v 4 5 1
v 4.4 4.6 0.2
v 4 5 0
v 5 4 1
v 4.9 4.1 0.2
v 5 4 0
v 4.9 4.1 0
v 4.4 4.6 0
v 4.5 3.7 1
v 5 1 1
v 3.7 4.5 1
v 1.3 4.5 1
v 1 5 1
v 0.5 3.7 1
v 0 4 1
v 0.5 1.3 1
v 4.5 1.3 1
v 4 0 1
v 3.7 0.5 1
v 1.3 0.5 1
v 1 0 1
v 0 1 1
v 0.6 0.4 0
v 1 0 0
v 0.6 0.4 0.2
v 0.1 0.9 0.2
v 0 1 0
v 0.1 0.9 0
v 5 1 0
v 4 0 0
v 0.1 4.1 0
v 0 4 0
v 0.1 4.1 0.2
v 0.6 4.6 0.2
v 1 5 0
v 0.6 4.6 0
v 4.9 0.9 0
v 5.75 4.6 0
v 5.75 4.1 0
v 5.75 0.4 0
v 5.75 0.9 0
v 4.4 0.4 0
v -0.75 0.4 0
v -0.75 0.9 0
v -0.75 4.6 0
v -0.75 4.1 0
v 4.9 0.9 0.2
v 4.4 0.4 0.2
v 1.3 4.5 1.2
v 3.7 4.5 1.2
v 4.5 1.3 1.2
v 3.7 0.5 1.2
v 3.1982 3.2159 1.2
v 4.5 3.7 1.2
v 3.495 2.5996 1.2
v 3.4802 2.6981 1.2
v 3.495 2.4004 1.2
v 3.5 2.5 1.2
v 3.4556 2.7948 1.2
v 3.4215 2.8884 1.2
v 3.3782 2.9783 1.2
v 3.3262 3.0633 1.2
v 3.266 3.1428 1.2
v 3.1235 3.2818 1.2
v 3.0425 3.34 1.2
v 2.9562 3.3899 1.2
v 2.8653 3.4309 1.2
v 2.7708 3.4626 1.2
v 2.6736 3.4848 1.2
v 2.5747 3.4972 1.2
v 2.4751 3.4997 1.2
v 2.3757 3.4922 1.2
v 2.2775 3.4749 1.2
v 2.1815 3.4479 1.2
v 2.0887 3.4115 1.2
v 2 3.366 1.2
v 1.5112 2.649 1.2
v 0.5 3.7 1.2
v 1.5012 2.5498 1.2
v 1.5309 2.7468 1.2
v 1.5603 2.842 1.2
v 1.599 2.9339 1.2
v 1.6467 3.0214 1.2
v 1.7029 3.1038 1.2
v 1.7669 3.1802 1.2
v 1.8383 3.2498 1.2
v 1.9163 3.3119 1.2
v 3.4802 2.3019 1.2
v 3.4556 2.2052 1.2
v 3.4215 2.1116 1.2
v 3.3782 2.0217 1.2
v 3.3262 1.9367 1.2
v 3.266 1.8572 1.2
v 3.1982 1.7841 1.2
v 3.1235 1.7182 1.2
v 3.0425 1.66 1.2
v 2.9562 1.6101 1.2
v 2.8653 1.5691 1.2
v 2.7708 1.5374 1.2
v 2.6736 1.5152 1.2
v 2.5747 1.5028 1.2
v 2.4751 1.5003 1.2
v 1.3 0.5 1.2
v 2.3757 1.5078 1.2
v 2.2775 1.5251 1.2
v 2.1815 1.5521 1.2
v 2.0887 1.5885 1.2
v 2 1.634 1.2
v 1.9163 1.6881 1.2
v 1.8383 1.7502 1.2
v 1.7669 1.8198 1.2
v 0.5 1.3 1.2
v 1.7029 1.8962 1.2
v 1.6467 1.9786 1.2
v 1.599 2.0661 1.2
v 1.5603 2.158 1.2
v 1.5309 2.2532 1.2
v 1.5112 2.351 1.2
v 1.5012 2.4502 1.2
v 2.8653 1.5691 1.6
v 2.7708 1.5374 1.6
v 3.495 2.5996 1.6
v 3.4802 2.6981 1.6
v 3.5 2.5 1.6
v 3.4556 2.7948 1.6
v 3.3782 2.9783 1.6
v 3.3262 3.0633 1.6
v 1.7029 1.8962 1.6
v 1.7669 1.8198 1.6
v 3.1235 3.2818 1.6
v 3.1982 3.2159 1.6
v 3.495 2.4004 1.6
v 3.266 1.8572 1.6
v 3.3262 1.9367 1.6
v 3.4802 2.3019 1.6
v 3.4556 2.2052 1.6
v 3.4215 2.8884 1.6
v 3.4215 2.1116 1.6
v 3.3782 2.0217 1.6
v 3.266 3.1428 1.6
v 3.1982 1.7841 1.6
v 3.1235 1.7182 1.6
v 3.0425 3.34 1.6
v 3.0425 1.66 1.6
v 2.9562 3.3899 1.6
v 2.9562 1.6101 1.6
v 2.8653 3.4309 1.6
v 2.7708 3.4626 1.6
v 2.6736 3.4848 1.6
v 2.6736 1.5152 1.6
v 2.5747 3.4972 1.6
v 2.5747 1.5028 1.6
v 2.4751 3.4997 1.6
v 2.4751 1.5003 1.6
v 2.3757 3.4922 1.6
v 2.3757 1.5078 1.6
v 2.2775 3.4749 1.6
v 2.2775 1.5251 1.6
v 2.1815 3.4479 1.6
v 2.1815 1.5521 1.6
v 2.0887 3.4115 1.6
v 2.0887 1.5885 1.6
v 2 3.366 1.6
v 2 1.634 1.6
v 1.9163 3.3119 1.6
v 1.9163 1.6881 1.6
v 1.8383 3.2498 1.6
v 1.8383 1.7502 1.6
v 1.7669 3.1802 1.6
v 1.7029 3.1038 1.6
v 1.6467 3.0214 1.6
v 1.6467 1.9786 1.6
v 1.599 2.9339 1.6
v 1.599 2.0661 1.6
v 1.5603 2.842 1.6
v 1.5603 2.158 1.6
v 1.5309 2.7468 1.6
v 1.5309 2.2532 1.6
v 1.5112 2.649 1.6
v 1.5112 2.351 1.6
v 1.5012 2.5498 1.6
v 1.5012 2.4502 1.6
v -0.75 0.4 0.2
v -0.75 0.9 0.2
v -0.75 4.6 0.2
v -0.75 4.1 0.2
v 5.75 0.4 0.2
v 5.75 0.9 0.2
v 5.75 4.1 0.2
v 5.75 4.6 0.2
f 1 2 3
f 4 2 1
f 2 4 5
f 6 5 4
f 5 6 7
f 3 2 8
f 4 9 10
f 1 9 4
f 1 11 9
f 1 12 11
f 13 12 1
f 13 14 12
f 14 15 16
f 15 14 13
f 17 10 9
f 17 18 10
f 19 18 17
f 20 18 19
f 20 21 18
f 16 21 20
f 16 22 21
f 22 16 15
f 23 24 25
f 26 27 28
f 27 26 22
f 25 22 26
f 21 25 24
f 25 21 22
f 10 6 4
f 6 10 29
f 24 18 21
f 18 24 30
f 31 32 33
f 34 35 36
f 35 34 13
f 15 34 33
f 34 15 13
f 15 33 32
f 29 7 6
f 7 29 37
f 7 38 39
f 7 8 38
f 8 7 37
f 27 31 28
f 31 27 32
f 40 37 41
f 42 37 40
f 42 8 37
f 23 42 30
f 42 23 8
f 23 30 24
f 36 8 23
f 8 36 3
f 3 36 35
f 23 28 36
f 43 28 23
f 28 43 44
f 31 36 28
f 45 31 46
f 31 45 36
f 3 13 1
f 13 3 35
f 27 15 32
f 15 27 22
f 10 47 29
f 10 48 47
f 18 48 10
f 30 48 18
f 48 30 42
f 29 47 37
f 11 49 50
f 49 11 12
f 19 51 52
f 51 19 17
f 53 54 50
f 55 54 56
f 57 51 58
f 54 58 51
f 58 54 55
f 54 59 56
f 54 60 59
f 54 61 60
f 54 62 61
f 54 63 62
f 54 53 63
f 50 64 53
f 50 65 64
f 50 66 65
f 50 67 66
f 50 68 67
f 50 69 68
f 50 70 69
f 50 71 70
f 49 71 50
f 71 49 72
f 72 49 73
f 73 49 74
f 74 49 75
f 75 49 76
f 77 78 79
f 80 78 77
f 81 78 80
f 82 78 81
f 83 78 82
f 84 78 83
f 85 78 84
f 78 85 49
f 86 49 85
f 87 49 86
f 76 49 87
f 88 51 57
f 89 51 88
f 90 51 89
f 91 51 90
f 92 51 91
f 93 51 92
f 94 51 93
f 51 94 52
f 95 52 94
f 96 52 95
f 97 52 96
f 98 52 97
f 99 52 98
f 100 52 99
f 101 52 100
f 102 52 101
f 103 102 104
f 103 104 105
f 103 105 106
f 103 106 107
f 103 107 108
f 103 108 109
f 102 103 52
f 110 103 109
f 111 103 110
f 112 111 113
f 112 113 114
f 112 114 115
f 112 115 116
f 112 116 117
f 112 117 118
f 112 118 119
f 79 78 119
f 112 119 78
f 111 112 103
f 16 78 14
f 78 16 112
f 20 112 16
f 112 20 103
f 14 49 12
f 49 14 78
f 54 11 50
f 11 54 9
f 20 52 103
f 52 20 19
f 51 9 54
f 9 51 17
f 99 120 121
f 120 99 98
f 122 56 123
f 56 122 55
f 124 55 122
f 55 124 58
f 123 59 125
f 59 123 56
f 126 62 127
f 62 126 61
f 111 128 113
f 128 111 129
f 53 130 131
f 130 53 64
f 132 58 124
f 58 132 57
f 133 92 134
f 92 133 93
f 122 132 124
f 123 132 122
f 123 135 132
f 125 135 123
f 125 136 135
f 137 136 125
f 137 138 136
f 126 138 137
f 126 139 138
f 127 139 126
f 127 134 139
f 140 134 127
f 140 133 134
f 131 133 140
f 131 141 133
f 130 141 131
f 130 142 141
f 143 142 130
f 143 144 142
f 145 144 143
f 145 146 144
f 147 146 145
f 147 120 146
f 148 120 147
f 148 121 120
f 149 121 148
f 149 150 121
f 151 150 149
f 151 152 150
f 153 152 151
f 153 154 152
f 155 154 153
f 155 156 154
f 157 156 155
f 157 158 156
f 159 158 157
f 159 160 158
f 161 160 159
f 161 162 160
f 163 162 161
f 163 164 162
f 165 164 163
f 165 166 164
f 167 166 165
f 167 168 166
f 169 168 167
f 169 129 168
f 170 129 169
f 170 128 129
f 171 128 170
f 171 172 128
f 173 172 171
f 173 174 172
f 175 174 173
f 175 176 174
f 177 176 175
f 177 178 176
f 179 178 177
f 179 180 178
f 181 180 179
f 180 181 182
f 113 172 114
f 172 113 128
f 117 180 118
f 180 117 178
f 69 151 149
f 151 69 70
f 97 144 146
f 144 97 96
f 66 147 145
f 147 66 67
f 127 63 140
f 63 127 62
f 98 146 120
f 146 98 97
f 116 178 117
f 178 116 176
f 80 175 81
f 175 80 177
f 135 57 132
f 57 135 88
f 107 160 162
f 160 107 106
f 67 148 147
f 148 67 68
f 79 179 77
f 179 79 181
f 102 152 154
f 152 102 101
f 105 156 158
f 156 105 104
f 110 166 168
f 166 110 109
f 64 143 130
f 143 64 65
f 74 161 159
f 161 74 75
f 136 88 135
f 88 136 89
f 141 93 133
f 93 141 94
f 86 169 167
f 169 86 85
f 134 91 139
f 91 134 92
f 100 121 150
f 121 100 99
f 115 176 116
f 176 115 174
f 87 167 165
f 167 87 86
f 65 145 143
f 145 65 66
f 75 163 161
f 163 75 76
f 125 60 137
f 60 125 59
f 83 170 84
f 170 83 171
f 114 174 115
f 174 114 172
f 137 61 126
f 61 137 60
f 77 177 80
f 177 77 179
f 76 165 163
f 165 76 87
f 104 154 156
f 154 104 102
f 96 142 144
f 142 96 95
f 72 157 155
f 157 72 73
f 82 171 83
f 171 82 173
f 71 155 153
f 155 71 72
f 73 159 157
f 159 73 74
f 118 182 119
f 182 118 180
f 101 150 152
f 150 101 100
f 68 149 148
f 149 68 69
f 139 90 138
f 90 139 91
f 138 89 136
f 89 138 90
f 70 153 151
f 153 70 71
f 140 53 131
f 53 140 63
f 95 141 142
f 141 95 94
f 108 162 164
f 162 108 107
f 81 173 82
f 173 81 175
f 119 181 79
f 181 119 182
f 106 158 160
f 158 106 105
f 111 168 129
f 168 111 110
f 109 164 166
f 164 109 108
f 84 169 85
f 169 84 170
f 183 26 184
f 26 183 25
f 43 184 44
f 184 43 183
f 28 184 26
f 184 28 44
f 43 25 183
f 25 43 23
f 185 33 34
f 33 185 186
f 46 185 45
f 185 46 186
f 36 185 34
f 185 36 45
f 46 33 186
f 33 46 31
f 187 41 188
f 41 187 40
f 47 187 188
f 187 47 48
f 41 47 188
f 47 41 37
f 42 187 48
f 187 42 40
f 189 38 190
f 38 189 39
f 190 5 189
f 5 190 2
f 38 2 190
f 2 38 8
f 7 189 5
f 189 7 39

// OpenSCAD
/*
 * 5x5H1.6.scad - 3D Pushbutton Switch for Kicad
 * 
 * Copyright (C) 2015-2019 Theophilus
 *
 * osab
 *
 * License: Matthew 10:8b - "freely ye have received, freely give."
 *
 * Use this information at your own risk.
 *
 */

$fa=0.1; // default minimum facet angle is now 0.1
$fs=0.1; // default minimum facet size is now 0.1 mm

module pin() {
	cube([1.5,0.5,0.2]);
}

linear_extrude(height=1)
polygon([[0,1],[1,0],[4,0],[5,1],[5,4],[4,5],[1,5],[0,4]]);

translate([0.5,0.5,1])
linear_extrude(height=0.2)
polygon([[0,4/5*1],[4/5*1,0],[4/5*4,0],[4/5*5,4/5*1],[4/5*5,4/5*4],[4/5*4,4/5*5],[4/5*1,4/5*5],[0,4/5*4]]);

translate([2.5,2.5,1.2])
cylinder(h=0.4, d=2);

translate([-0.75,0.4,0])
pin();

translate([-0.75,4.1,0])
pin();

translate([4.25,0.4,0])
pin();

translate([4.25,4.1,0])
pin();
